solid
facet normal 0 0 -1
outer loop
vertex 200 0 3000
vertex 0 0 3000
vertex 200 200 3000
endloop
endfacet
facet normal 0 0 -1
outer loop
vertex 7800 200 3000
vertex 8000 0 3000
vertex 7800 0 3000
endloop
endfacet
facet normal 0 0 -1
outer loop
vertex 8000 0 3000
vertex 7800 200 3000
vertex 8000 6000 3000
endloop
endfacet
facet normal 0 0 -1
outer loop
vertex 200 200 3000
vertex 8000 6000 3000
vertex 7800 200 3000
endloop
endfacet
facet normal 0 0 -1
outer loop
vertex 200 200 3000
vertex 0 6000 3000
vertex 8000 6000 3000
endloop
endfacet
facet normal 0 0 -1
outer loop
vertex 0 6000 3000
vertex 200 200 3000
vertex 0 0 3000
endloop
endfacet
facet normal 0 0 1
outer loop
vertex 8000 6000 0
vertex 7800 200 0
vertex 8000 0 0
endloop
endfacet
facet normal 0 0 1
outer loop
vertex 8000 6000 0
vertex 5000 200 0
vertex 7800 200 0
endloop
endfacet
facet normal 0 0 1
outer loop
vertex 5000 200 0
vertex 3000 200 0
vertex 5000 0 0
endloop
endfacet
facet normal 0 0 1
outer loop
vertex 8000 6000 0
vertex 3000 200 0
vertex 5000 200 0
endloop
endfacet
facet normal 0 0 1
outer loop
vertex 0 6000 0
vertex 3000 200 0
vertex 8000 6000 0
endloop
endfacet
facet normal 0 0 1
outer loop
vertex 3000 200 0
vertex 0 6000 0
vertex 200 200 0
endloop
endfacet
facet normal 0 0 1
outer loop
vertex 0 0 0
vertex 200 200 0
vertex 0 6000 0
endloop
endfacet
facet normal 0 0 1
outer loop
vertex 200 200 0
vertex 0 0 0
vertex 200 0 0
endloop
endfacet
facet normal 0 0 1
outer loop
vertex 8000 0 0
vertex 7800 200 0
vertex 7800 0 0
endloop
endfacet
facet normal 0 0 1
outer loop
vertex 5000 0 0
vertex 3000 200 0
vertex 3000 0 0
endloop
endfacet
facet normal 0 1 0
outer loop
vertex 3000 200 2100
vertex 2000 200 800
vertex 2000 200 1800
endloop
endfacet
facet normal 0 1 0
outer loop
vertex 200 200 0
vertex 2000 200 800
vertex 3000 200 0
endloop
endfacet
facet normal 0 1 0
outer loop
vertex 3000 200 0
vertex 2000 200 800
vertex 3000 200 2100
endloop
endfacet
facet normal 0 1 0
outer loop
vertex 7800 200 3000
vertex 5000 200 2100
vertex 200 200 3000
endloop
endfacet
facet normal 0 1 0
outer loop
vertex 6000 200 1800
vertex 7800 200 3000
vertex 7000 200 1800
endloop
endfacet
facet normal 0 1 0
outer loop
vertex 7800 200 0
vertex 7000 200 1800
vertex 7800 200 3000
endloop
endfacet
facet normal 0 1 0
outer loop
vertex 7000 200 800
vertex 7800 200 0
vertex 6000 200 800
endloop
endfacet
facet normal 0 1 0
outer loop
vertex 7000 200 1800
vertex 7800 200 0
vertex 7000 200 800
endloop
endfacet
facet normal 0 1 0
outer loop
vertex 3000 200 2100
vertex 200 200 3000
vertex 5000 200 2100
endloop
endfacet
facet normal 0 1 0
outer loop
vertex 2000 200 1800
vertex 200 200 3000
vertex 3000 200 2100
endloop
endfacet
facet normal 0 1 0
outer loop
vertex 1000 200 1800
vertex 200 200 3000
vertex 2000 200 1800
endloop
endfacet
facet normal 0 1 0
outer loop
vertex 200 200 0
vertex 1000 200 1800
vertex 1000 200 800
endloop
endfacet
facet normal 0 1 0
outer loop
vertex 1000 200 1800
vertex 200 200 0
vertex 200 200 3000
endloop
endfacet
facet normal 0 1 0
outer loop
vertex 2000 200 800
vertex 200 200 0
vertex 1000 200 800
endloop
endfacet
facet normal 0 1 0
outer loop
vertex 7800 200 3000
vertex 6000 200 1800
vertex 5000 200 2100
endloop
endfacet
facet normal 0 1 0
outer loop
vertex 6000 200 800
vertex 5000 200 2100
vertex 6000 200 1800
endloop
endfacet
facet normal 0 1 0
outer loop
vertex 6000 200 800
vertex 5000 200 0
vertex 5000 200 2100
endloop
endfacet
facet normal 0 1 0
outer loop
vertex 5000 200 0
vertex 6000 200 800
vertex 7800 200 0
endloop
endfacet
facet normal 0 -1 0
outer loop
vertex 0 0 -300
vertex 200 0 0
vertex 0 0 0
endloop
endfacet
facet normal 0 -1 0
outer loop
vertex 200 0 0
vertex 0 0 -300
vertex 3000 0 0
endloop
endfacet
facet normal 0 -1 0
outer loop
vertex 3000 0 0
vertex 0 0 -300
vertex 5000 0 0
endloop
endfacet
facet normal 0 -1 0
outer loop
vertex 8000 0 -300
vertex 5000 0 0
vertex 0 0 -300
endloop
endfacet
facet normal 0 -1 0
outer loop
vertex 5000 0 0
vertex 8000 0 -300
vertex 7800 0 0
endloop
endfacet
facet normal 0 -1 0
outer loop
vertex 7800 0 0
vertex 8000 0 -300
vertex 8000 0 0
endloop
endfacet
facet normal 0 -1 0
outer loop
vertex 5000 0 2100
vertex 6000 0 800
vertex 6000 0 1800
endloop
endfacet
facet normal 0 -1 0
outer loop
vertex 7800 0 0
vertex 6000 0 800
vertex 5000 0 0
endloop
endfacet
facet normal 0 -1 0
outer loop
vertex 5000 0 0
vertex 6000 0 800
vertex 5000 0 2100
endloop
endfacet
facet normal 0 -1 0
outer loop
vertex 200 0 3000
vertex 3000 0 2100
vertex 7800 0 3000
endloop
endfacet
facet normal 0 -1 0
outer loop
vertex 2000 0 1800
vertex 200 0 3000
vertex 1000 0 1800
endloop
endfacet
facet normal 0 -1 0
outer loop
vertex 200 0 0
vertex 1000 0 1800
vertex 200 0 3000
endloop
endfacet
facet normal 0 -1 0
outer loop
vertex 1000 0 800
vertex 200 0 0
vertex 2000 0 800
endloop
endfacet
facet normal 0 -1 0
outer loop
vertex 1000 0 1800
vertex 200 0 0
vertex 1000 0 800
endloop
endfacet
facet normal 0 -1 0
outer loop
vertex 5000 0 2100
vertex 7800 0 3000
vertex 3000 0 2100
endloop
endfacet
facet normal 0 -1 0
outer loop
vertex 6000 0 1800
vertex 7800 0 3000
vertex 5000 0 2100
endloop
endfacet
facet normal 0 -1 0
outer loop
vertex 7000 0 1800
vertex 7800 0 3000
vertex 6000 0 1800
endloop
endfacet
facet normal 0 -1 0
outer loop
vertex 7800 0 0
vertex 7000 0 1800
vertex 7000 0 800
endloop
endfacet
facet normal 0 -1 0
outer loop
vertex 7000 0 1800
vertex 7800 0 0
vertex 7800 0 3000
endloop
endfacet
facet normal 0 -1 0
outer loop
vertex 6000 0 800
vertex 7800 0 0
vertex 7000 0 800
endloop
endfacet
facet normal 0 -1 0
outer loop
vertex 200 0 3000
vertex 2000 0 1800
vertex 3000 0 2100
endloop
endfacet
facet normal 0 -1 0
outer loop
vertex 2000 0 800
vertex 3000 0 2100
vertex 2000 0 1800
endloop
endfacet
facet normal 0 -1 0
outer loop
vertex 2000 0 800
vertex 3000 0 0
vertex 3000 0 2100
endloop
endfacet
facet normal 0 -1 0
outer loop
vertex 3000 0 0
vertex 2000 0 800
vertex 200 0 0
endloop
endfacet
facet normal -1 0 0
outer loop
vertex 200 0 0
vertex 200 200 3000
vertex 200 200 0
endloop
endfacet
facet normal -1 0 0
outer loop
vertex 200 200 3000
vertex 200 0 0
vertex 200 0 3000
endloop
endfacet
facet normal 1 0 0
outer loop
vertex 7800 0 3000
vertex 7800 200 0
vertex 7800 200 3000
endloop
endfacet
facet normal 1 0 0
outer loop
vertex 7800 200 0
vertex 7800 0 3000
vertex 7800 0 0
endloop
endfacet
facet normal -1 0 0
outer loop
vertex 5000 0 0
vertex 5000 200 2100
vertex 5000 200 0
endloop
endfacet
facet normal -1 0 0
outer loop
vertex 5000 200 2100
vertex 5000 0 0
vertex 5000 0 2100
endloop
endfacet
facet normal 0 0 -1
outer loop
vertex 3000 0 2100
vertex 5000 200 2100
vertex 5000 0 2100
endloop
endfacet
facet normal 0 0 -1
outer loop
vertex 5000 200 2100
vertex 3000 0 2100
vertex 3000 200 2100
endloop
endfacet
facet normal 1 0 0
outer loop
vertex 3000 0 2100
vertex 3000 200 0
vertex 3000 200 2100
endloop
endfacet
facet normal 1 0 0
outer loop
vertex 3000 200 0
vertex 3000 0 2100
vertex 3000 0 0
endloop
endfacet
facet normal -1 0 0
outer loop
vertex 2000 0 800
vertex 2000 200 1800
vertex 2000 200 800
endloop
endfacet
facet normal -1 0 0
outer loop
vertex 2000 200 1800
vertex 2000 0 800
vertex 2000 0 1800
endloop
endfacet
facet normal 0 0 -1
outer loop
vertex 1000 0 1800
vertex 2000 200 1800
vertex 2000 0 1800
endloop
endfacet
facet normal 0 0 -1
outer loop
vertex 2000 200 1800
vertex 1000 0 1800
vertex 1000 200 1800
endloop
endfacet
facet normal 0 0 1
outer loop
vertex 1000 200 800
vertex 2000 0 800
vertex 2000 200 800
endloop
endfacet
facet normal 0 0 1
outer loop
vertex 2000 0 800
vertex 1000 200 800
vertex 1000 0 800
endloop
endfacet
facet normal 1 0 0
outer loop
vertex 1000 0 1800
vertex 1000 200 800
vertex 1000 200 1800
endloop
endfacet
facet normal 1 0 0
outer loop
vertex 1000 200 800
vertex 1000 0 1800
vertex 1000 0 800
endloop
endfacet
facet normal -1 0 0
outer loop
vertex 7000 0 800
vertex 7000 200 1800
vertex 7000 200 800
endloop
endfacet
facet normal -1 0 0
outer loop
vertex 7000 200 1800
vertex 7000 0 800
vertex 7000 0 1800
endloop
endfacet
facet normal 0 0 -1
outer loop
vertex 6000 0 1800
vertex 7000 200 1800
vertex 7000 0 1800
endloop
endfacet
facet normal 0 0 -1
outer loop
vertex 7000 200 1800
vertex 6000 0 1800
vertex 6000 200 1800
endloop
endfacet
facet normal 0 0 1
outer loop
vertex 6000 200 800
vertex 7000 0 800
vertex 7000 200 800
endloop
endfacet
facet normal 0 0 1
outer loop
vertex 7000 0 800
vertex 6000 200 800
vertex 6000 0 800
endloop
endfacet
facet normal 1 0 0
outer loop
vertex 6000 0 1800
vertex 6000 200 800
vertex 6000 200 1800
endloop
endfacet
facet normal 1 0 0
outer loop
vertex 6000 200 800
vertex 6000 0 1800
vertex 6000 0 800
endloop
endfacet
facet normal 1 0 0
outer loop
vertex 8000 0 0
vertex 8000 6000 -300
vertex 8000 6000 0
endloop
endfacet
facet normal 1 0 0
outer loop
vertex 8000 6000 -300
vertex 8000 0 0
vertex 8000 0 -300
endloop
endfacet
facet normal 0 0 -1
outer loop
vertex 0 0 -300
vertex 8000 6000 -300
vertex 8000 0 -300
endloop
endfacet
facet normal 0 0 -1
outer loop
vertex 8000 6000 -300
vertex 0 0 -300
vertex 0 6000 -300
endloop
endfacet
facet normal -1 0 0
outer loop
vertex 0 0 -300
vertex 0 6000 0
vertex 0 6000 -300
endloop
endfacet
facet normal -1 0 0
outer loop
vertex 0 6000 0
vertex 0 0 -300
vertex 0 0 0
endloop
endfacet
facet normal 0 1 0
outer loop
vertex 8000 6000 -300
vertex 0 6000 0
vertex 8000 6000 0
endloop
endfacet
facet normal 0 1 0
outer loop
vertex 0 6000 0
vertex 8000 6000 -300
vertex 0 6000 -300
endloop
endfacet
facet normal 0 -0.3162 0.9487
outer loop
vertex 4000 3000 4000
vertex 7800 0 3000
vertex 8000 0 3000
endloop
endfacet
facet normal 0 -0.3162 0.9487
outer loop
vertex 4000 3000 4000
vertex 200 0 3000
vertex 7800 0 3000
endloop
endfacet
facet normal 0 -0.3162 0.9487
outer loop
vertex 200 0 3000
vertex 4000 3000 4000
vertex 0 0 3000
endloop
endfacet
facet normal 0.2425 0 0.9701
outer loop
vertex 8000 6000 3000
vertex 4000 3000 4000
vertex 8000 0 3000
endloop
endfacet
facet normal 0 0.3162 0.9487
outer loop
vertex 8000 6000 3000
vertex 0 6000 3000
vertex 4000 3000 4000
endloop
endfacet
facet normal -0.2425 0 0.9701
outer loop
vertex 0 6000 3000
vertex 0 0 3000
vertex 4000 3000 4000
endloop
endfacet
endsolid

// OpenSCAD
// Simple House SCAD Model for Benchmarking
// Basic concrete house structure

// House dimensions
wall_thickness = 200;  // 200mm thick concrete walls
wall_height = 3000;    // 3m high
wall_length = 8000;    // 8m long
wall_width = 6000;     // 6m wide

// Foundation
translate([0, 0, -300]) {
    cube([wall_length, wall_width, 300]);  // 300mm foundation
}

// Main structure
difference() {
    // Outer walls
    translate([0, 0, 0]) {
        cube([wall_length, wall_thickness, wall_height]);  // Front wall
    }
    translate([0, wall_width - wall_thickness, 0]) {
        cube([wall_length, wall_thickness, wall_height]);  // Back wall
    }
    translate([0, 0, 0]) {
        cube([wall_thickness, wall_width, wall_height]);  // Left wall
    }
    translate([wall_length - wall_thickness, 0, 0]) {
        cube([wall_thickness, wall_width, wall_height]);  // Right wall
    }

    // Door opening (front wall, center)
    translate([wall_length/2 - 1000, -1, 0]) {
        cube([2000, wall_thickness + 2, 2100]);  // 2m wide, 2.1m high door
    }

    // Window openings
    // Front wall windows
    translate([1000, -1, 800]) {
        cube([1000, wall_thickness + 2, 1000]);  // Left window
    }
    translate([wall_length - 2000, -1, 800]) {
        cube([1000, wall_thickness + 2, 1000]);  // Right window
    }

    // Back wall windows
    translate([2000, wall_width - wall_thickness - 1, 800]) {
        cube([1000, wall_thickness + 2, 1000]);  // Back left window
    }
    translate([wall_length - 3000, wall_width - wall_thickness - 1, 800]) {
        cube([1000, wall_thickness + 2, 1000]);  // Back right window
    }
}

// Roof (simple gable roof)
roof_height = 1000;
translate([0, 0, wall_height]) {
    polyhedron(
        points = [
            [0, 0, 0],                           // 0: front left bottom
            [wall_length, 0, 0],                  // 1: front right bottom
            [wall_length, wall_width, 0],         // 2: back right bottom
            [0, wall_width, 0],                   // 3: back left bottom
            [wall_length/2, wall_width/2, roof_height]  // 4: peak
        ],
        faces = [
            [0, 1, 4],  // front triangle
            [1, 2, 4],  // right triangle
            [2, 3, 4],  // back triangle
            [3, 0, 4],  // left triangle
            [0, 3, 2, 1] // bottom rectangle
        ]
    );
}
